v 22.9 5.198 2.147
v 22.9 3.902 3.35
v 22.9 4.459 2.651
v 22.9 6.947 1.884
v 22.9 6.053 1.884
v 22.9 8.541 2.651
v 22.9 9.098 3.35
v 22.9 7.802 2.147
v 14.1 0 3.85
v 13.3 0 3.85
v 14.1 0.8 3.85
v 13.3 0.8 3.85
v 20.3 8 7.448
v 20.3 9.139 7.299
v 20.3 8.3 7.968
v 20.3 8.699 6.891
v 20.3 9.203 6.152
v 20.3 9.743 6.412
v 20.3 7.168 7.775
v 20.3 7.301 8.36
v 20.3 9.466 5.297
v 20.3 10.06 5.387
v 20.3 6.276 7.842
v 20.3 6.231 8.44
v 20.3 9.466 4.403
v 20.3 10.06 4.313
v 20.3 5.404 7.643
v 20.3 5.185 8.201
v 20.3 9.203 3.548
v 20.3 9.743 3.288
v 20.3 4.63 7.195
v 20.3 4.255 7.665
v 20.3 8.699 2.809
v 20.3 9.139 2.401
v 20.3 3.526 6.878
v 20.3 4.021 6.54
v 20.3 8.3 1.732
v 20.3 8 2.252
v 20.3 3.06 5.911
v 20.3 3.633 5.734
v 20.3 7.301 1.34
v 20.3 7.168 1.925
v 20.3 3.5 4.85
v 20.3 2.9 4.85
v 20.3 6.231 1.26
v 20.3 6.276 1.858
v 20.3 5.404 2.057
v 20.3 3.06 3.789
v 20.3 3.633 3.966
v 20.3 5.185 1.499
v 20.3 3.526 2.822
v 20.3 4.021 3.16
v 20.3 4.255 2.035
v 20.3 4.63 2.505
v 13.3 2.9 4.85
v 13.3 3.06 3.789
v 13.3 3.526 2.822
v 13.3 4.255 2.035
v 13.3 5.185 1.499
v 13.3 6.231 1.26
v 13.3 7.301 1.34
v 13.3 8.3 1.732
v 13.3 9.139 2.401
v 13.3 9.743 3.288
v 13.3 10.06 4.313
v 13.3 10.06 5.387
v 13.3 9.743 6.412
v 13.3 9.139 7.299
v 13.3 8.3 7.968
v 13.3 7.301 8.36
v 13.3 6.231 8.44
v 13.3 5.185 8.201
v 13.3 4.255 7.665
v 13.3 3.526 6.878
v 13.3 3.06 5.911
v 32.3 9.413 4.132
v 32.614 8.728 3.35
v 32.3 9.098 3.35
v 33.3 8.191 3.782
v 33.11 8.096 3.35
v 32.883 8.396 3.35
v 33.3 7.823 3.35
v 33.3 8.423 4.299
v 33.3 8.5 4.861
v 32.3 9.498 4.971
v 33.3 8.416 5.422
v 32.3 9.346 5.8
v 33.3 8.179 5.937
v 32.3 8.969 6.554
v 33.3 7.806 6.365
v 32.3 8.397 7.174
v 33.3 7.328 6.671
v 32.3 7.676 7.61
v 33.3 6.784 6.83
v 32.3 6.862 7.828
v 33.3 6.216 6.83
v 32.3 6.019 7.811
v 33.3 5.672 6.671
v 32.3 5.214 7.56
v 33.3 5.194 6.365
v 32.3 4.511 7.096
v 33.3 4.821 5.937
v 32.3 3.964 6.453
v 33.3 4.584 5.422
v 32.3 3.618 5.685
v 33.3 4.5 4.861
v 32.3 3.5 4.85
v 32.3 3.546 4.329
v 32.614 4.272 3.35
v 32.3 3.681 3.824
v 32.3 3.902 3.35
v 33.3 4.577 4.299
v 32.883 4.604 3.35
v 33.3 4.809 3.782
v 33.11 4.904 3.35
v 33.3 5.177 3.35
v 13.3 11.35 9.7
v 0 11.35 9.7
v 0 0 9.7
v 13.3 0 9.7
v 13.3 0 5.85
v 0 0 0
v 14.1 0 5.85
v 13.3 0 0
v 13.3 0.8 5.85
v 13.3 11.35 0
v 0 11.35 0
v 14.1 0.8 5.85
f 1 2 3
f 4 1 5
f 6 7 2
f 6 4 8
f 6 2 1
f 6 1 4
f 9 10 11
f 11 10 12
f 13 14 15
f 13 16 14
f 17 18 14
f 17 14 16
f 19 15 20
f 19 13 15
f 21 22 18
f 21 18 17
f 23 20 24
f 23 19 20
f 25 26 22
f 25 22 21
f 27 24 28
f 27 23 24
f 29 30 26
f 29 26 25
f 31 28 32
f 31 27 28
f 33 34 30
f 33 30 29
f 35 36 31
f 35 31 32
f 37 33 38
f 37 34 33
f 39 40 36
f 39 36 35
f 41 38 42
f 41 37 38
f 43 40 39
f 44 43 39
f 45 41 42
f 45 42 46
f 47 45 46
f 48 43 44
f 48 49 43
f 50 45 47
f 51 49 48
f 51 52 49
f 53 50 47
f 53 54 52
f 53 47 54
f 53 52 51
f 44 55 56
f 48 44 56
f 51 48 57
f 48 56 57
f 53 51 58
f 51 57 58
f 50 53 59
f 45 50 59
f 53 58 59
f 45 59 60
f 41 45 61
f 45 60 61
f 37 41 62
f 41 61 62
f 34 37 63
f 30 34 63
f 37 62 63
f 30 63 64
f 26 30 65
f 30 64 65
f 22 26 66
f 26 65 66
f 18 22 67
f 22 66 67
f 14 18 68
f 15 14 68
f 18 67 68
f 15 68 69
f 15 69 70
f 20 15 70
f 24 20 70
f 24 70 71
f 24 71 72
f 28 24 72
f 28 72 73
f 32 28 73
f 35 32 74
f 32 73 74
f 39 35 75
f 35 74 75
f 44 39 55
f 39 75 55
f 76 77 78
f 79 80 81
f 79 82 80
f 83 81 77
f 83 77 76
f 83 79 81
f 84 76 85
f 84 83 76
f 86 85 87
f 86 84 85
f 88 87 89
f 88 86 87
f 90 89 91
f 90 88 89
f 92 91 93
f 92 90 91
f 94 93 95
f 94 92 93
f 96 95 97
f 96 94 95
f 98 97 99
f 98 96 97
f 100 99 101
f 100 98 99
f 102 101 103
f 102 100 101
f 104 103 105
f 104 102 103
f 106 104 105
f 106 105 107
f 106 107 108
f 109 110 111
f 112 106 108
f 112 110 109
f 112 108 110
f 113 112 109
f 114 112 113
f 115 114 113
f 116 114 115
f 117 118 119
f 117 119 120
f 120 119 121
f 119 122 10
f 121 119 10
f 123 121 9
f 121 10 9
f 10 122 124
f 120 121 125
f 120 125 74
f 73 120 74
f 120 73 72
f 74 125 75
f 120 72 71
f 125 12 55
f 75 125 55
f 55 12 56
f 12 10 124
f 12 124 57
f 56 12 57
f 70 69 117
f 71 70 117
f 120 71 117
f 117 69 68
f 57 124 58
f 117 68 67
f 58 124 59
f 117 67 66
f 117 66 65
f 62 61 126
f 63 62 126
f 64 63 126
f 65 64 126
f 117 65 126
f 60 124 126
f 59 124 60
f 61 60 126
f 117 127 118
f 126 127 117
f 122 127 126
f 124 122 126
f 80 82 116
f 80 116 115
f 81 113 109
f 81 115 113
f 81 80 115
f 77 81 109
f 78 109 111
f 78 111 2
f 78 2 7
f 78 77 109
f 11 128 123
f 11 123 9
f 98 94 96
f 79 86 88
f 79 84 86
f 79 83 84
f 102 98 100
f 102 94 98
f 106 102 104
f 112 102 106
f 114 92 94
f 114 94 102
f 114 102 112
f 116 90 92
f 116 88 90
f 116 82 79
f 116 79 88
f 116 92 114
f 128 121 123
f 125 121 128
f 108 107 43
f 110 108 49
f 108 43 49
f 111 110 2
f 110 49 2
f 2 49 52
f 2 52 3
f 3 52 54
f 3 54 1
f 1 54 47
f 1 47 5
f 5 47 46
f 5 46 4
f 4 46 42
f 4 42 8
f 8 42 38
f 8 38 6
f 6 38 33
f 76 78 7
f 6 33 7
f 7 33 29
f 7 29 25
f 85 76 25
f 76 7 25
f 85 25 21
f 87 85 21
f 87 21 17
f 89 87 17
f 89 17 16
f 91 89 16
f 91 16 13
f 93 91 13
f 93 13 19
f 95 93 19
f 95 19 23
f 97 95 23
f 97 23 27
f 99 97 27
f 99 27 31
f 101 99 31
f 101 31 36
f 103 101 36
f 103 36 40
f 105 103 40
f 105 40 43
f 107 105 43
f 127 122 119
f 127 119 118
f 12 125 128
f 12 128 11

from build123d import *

# Parameters (mm, degrees)
SKETCH1_W           = 13.3
SKETCH1_H           = 11.35
BOSS_EXTRUDE1_DEPTH = 9.7
SKETCH2_R           = 3.6
BOSS_EXTRUDE2_DEPTH = 7
SKETCH3_R           = 3
BOSS_EXTRUDE4_DEPTH = 13
SKETCH4_W           = 2
SKETCH4_H           = 0.8
BOSS_EXTRUDE5_DEPTH = 0.8
SKETCH5_W           = 9.645805708
SKETCH5_H           = 9.062919638
CUT_EXTRUDE1_DEPTH  = 10.4
CHAMFER1_SIZE       = 1


with BuildPart() as part:
    # Sketch1 → Boss-Extrude1 (new body)
    with BuildSketch(Plane.XY):
        with Locations((6.65, 5.675)):
            Rectangle(SKETCH1_W, SKETCH1_H)
    extrude(amount=BOSS_EXTRUDE1_DEPTH)

    # Sketch2 → Boss-Extrude2 (add)
    with BuildSketch(Plane(origin=(13.3, 0, 0), x_dir=(0, 0, -1), z_dir=(1, 0, 0))):
        with Locations(Location((-4.85, 6.5, 0), (0, 0, 270))):  # turned: the seam where the file's is
            Circle(SKETCH2_R)
    extrude(amount=BOSS_EXTRUDE2_DEPTH)

    # Sketch3 → Boss-Extrude4 (add)
    with BuildSketch(Plane(origin=(20.3, 0, 0), x_dir=(0, 0, -1), z_dir=(1, 0, 0))):
        with Locations(Location((-4.85, 6.5, 0), (0, 0, 270))):  # turned: the seam where the file's is
            Circle(SKETCH3_R)
    extrude(amount=BOSS_EXTRUDE4_DEPTH)

    # Sketch4 → Boss-Extrude5 (add)
    with BuildSketch(Plane(origin=(13.3, 0, 0), x_dir=(0, 0, -1), z_dir=(1, 0, 0))):
        with Locations((-4.85, 0.4)):
            Rectangle(SKETCH4_W, SKETCH4_H)
    extrude(amount=BOSS_EXTRUDE5_DEPTH)

    # Sketch5 → Cut-Extrude1 (cut)
    with BuildSketch(Plane(origin=(33.3, 0, 0), x_dir=(0, 0, -1), z_dir=(1, 0, 0))):
        with Locations((1.472902854, 6.5)):
            Rectangle(SKETCH5_W, SKETCH5_H)
    extrude(amount=-CUT_EXTRUDE1_DEPTH, mode=Mode.SUBTRACT)

    # Chamfer1
    chamfer1_edges = [part.edges().sort_by_distance(p)[0] for p in [
        (33.3, 7.276457135, 7.747777479),
    ]]
    chamfer(chamfer1_edges, length=CHAMFER1_SIZE)


solid = part.part
